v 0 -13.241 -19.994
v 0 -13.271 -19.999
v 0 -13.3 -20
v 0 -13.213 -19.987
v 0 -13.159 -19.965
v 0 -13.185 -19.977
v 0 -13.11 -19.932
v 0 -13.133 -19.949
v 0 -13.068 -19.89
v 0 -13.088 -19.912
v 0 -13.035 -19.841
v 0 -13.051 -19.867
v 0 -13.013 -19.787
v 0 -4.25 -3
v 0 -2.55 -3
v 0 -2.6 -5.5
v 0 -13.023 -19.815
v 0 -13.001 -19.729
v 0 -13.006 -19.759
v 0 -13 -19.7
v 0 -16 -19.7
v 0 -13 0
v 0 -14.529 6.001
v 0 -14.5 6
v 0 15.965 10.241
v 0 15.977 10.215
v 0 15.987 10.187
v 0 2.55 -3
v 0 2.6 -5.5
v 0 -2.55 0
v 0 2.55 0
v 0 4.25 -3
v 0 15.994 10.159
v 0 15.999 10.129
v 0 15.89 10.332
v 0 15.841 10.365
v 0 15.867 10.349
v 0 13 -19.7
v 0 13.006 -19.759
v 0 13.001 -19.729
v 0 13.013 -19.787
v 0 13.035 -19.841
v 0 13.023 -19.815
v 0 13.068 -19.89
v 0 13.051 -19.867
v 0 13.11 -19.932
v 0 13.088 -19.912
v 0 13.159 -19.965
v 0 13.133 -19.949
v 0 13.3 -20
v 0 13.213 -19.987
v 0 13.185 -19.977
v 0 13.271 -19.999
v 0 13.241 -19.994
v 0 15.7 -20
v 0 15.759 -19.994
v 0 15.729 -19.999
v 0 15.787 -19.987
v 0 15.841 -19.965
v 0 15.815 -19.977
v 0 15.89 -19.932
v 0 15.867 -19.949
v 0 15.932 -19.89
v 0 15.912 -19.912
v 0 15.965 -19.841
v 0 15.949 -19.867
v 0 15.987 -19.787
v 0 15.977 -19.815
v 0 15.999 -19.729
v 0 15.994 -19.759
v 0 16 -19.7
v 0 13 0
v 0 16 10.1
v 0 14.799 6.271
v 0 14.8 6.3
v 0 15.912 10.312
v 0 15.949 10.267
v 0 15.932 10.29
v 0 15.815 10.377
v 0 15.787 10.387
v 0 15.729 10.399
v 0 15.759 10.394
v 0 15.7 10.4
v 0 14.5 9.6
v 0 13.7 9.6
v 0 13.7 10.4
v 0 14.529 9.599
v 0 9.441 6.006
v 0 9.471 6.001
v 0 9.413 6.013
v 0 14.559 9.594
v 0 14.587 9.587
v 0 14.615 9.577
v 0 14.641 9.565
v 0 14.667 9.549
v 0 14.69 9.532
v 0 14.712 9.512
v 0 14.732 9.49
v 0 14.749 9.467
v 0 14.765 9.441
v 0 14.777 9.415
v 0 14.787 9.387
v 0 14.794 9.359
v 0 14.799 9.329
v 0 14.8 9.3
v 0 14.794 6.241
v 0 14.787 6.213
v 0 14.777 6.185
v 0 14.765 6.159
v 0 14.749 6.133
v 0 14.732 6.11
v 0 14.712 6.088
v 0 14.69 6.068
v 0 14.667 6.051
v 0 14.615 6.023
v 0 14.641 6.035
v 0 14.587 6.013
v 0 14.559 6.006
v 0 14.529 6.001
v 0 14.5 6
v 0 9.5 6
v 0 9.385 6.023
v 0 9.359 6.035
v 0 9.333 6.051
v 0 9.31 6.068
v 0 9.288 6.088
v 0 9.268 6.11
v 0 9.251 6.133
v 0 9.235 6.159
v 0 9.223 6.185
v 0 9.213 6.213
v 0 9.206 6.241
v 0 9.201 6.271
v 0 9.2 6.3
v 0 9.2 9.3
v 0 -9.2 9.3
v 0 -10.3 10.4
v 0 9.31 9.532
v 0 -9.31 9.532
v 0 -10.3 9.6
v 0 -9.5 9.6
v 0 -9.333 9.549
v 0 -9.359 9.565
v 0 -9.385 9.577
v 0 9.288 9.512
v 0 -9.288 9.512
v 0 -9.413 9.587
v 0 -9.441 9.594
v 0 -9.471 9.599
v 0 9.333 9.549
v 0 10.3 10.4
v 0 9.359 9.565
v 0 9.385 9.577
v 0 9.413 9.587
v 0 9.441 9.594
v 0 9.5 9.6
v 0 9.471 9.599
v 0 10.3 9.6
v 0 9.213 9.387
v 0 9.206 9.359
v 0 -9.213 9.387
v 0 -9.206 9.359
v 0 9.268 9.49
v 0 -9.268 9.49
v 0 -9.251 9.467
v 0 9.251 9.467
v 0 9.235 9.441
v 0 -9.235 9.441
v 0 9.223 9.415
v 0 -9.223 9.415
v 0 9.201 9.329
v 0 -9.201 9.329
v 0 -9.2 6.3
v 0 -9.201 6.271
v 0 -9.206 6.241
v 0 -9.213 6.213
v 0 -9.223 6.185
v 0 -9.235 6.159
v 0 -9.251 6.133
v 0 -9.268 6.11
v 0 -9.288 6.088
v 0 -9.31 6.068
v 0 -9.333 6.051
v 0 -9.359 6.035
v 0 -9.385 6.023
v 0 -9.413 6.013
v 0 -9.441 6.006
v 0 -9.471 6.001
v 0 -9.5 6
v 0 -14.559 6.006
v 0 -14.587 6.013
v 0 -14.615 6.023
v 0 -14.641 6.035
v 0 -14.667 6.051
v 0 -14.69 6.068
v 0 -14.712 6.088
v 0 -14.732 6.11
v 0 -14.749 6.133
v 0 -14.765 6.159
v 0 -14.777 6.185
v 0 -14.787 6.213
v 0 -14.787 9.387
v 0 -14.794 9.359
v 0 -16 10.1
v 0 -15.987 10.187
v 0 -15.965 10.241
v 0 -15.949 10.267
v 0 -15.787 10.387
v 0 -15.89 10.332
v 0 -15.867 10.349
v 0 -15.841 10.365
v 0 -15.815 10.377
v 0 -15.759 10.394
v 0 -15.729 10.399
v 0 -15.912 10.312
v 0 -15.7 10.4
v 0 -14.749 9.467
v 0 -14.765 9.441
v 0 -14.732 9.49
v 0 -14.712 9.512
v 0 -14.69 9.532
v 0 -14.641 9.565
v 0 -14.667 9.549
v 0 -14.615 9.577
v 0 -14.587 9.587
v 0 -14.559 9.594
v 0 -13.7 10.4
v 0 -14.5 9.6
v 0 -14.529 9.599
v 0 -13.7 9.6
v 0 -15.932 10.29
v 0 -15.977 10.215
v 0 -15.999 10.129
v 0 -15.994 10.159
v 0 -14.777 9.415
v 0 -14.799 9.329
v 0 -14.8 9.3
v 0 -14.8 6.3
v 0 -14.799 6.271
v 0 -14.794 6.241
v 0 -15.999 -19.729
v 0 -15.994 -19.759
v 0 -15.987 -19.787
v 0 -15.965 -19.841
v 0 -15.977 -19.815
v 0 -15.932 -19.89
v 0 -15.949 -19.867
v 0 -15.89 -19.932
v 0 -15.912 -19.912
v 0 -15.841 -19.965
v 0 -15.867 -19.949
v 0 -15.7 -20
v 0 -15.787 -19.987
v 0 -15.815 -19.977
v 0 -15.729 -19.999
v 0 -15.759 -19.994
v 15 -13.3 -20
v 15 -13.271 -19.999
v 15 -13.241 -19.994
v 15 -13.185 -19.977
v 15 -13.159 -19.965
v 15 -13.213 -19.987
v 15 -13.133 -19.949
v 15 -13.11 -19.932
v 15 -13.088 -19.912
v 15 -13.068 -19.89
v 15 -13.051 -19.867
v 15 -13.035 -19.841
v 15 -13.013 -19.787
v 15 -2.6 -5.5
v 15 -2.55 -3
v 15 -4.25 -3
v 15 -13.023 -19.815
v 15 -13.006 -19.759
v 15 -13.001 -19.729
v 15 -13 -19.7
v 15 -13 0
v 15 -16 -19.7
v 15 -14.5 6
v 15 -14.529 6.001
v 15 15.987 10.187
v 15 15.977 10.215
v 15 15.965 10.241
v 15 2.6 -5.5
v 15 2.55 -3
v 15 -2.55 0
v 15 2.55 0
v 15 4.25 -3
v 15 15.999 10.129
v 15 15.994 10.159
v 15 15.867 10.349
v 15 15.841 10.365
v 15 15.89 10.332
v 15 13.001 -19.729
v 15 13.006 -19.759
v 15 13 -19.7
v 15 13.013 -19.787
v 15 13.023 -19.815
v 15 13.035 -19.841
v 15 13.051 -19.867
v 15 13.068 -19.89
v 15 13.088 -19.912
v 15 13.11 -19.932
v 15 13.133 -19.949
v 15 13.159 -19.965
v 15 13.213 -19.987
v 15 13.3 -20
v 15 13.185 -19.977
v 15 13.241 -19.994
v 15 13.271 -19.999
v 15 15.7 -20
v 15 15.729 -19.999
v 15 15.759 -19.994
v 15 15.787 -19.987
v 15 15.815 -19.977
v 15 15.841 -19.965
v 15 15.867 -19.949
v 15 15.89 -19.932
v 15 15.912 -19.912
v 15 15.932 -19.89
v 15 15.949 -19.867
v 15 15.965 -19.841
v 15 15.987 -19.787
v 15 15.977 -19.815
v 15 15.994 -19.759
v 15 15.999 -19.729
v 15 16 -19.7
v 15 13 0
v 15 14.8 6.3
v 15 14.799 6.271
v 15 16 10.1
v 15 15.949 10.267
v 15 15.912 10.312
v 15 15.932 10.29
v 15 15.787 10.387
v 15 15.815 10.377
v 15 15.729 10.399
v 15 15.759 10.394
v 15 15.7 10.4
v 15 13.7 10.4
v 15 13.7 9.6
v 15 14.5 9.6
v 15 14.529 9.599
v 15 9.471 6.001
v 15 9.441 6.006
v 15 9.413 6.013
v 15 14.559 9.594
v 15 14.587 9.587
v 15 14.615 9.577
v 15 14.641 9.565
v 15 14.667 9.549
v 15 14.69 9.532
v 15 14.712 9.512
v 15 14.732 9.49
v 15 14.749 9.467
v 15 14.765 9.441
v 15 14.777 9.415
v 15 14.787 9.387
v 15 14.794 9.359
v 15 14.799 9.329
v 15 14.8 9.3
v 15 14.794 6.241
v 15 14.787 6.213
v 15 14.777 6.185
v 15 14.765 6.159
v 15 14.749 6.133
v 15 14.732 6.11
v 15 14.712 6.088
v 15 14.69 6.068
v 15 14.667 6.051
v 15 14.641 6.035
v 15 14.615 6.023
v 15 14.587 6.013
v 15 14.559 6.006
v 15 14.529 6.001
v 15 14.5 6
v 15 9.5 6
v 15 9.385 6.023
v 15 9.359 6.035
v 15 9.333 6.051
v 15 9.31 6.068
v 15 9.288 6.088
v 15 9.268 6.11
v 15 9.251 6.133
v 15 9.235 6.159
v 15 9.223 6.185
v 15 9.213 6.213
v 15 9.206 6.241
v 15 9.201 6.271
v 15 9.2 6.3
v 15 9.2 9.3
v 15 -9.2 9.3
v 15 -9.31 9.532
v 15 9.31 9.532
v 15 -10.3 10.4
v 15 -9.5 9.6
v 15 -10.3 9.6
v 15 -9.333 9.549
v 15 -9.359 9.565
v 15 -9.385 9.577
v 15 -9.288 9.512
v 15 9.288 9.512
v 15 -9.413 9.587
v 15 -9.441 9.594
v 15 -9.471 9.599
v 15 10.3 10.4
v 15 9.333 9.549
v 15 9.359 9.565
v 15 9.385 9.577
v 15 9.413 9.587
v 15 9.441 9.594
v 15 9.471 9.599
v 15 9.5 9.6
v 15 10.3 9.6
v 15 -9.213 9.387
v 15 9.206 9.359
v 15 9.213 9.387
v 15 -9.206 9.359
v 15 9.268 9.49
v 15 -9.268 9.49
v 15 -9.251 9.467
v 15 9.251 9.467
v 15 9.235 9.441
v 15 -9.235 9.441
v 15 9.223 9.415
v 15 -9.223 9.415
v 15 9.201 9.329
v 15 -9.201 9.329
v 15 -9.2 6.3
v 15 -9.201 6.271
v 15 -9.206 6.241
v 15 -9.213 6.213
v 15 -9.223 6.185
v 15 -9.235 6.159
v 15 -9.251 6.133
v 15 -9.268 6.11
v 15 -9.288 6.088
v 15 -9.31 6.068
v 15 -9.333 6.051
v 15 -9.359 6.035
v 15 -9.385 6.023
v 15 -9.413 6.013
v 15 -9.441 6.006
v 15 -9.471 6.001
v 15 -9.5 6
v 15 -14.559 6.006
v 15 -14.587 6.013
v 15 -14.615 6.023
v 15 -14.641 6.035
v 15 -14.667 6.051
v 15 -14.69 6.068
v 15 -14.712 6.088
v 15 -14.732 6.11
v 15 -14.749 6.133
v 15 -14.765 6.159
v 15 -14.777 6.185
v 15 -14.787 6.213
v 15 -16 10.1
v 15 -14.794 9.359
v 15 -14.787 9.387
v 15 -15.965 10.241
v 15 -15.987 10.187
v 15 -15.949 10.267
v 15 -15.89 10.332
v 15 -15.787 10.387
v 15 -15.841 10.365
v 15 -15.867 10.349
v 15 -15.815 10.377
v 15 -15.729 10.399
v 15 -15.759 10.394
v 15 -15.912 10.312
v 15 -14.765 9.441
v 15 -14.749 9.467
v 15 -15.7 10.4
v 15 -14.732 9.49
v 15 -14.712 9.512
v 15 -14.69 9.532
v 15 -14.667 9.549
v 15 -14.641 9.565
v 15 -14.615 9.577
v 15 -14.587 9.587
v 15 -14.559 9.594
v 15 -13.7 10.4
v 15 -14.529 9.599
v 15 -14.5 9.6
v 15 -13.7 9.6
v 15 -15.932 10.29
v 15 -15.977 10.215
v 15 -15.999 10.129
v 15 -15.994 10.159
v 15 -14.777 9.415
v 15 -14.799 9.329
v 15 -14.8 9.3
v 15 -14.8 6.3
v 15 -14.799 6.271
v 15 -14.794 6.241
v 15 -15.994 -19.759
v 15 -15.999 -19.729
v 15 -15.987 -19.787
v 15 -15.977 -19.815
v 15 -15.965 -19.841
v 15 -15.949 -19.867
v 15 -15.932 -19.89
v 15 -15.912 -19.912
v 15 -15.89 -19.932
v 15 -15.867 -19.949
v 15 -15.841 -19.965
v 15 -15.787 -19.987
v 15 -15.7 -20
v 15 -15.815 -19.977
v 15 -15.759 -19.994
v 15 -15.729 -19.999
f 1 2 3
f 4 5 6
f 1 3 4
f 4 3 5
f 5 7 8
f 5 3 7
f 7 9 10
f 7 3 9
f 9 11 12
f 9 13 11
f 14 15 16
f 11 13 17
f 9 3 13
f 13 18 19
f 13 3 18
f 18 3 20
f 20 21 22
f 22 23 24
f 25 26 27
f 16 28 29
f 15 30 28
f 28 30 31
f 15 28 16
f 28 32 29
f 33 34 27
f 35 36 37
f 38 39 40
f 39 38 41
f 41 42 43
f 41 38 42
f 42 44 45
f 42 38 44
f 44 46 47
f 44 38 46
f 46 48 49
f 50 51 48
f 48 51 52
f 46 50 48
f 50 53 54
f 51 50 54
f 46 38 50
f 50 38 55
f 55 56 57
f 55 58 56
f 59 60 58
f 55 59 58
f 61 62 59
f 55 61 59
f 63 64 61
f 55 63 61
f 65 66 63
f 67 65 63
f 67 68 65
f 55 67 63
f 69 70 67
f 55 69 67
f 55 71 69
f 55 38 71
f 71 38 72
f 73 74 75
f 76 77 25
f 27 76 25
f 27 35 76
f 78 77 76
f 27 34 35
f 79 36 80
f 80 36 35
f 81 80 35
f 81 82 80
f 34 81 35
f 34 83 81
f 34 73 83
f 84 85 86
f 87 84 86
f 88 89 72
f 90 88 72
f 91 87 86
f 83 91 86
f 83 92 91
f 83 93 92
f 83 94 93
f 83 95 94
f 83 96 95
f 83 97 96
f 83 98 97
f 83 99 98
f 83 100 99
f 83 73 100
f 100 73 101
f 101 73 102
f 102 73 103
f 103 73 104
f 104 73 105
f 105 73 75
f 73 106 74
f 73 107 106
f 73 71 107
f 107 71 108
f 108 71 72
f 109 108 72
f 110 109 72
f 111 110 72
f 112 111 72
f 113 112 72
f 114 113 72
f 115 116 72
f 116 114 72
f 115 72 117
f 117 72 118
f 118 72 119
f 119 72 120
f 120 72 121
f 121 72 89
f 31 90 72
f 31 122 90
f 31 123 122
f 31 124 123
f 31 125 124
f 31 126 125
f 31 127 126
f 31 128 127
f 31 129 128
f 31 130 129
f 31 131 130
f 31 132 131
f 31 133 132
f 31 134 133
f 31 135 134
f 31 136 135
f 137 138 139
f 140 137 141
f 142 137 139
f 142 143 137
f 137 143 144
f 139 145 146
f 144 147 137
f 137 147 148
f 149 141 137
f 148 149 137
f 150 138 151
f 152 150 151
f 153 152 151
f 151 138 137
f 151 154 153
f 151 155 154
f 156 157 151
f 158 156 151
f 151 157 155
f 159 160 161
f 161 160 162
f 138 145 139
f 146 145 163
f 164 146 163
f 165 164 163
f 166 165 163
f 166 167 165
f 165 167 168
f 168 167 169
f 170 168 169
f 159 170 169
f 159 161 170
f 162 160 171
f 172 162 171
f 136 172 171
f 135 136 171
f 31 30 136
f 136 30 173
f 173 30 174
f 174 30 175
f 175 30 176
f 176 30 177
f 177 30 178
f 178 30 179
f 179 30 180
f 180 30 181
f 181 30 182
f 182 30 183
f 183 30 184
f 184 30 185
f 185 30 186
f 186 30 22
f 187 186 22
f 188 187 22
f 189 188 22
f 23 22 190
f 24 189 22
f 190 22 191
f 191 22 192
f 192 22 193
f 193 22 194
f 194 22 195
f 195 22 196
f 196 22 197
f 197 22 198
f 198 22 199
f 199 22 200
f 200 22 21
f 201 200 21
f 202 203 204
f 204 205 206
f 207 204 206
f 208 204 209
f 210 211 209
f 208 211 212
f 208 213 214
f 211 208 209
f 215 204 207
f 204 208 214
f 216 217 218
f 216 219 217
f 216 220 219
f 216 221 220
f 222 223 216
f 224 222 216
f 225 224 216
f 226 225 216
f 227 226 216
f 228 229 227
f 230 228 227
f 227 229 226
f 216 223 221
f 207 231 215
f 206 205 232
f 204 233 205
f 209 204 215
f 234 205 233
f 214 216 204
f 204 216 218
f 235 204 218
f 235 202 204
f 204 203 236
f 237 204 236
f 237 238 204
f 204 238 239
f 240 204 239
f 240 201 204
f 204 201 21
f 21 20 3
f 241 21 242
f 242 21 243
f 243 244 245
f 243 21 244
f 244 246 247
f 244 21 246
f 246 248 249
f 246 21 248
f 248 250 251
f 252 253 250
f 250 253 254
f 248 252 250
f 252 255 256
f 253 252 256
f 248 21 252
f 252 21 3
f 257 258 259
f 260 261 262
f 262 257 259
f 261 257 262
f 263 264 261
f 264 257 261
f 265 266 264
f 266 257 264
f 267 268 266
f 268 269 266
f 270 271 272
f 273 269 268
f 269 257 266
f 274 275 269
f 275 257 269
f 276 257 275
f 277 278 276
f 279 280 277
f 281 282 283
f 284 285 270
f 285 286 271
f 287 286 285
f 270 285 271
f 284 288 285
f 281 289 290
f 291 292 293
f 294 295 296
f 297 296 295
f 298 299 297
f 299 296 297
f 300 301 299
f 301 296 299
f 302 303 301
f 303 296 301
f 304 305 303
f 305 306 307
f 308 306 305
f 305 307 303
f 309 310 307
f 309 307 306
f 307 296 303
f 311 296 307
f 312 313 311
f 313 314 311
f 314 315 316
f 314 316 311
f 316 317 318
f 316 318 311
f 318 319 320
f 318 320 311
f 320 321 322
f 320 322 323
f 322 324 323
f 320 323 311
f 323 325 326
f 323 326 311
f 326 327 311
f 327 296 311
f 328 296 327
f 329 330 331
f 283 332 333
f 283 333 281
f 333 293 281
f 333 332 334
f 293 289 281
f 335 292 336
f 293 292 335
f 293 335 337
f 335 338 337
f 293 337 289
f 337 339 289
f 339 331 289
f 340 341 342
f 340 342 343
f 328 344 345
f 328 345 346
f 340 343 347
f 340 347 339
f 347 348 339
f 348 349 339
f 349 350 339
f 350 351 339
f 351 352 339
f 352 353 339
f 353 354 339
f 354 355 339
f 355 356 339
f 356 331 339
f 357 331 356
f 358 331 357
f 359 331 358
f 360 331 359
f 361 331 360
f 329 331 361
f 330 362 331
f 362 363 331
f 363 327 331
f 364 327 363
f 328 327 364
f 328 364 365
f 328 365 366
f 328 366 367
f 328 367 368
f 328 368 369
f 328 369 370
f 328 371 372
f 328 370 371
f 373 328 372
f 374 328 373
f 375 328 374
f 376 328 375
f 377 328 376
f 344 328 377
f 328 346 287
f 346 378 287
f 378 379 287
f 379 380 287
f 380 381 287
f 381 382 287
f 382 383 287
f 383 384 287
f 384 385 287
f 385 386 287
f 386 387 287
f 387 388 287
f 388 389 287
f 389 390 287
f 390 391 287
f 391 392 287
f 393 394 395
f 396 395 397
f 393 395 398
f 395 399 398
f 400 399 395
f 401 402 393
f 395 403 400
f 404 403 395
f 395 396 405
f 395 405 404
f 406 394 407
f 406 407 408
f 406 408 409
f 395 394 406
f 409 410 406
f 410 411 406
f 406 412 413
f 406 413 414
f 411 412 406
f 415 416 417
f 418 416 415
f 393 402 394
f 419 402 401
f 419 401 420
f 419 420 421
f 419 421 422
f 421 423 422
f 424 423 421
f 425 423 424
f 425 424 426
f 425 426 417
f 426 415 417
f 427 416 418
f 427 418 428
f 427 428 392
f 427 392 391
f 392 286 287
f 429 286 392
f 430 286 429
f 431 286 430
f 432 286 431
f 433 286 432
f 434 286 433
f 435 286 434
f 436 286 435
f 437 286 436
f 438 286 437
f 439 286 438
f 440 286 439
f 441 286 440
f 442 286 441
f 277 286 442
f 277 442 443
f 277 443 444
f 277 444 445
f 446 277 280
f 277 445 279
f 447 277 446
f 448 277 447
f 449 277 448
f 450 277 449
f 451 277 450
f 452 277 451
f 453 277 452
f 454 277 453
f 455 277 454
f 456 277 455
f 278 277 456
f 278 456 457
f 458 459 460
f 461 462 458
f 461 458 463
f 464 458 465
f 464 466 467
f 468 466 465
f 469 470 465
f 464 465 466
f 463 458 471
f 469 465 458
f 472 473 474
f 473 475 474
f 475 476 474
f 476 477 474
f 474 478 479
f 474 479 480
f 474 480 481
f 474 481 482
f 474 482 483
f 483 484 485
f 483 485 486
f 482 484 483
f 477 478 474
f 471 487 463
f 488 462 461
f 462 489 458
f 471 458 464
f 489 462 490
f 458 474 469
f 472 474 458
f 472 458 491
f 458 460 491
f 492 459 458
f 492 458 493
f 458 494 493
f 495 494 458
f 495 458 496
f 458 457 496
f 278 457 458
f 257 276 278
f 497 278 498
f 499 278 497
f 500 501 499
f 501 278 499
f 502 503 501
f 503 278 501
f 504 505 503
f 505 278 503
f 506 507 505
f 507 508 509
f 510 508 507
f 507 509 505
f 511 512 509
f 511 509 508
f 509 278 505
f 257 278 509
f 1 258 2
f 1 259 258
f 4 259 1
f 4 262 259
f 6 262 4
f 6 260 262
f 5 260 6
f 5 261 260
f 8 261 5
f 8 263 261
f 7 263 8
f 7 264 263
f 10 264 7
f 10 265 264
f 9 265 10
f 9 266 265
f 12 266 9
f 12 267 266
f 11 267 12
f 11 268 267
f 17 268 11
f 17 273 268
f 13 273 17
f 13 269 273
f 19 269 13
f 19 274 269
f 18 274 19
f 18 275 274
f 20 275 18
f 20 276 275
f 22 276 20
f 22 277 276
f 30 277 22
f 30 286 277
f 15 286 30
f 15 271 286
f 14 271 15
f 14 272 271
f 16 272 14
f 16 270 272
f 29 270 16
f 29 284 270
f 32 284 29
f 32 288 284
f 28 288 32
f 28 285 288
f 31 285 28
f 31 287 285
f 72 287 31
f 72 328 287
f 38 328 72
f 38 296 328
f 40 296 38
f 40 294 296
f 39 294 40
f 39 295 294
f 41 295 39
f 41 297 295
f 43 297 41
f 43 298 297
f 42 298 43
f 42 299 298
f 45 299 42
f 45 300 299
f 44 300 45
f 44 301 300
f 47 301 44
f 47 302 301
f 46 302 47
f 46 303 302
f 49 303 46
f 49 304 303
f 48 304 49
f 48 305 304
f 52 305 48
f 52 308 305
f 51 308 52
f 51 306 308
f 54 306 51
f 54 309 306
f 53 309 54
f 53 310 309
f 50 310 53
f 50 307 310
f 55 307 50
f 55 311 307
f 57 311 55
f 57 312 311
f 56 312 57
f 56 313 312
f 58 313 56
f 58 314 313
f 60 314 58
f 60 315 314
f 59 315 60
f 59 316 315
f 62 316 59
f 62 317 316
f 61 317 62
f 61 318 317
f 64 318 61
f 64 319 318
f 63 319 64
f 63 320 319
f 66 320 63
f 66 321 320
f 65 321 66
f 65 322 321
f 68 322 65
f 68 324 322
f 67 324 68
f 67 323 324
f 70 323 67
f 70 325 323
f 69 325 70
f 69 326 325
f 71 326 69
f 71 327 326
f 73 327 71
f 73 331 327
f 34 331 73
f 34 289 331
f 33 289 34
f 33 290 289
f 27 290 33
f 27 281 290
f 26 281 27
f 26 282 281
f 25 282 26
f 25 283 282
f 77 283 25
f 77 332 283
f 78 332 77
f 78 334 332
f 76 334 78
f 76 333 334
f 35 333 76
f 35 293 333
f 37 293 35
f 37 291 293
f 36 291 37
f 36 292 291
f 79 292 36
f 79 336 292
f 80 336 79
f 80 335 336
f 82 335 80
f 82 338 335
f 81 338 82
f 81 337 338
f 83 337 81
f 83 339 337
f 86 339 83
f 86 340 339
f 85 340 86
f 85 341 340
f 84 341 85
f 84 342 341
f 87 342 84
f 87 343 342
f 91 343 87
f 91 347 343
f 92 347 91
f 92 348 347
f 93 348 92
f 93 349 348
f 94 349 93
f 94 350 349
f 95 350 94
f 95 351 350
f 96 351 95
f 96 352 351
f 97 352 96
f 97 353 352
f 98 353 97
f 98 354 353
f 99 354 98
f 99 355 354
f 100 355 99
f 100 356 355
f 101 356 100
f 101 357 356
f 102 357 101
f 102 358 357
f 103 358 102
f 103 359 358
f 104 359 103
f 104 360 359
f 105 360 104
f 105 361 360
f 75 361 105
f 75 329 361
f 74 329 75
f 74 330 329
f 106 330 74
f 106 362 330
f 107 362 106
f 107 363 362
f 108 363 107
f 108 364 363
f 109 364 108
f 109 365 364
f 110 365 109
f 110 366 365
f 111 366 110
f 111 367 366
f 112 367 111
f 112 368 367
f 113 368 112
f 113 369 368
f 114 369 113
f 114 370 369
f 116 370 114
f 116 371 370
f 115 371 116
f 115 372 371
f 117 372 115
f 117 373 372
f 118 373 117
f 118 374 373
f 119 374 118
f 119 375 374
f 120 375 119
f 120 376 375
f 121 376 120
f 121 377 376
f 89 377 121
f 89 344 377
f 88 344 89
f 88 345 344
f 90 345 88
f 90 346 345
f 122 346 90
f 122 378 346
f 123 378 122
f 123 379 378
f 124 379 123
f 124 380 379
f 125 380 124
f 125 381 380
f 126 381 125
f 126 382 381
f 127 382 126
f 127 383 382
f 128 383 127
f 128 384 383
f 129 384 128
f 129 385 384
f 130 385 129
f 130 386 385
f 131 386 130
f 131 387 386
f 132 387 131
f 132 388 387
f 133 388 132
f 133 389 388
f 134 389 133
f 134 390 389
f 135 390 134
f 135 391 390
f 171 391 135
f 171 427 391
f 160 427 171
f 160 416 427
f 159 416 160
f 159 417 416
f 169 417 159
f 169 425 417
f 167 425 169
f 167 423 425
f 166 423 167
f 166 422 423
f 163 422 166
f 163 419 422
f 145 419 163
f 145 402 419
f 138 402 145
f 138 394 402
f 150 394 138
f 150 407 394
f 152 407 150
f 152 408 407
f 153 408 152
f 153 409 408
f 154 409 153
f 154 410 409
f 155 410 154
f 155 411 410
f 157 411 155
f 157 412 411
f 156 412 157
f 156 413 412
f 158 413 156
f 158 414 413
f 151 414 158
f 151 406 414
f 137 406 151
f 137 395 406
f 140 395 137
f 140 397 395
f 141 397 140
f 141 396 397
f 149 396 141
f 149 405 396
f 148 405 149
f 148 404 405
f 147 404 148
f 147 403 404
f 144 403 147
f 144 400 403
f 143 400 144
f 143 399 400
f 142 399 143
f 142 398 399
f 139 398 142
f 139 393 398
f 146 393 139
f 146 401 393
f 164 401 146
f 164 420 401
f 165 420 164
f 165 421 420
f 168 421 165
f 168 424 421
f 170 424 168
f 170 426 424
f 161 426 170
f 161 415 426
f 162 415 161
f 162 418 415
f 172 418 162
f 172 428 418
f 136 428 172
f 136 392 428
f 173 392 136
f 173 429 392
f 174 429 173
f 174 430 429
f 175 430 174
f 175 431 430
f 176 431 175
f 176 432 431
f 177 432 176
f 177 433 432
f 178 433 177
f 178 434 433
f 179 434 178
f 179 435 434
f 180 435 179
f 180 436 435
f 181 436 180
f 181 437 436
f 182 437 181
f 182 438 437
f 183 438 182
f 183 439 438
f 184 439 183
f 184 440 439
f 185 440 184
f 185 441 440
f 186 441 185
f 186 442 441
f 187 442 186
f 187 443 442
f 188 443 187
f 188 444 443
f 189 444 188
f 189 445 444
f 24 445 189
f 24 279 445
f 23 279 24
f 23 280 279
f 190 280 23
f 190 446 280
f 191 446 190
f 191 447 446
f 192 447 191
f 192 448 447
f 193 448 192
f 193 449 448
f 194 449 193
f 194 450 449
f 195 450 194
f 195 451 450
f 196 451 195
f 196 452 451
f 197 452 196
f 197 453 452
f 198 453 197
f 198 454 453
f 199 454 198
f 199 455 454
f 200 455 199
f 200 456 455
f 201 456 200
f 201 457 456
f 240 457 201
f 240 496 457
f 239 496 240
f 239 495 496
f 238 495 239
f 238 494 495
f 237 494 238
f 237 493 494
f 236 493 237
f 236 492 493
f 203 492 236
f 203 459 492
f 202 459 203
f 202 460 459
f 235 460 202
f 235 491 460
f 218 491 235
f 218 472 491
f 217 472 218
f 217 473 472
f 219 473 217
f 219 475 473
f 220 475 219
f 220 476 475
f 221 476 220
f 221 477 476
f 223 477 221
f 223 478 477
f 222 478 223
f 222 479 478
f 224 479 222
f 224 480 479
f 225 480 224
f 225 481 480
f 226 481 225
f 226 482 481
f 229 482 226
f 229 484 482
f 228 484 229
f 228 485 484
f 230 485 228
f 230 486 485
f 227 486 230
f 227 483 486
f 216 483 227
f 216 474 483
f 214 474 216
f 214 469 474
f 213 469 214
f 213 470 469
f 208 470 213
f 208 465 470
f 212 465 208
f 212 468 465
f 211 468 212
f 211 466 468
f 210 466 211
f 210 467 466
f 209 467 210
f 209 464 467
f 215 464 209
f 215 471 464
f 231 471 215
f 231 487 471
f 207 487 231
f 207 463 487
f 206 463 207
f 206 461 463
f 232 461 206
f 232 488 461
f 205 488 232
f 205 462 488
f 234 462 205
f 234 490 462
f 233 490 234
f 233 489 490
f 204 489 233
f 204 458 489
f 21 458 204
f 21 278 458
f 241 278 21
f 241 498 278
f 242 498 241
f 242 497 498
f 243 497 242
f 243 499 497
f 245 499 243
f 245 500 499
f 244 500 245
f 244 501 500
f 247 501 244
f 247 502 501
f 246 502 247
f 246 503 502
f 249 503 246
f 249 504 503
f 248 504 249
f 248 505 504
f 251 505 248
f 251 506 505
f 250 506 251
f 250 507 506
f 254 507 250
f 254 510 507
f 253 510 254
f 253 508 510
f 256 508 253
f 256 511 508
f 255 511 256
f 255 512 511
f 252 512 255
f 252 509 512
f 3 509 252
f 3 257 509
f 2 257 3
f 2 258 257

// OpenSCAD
// 2020 -> Eurorack threaded-strip adapter (dual-strip version)
//
// Variant of 2020-adapter.scad with captive strip channels on BOTH sides
// of the rail body (mirrored around Y=0).
//
// License: MIT, Copyright (c) 2026 Madelyn Yeary. See LICENSE.md at the repo root.

// ---- parameters ----------------------------------------------------------

length              = 15;  // rail length. My printer can only print 100mm wide so
                              // 84HP = 128.5; 104HP = 158.75; etc.

// 2020 slot profile (generic Misumi-style tapered T-slot).
slot_opening        = 5.3;    // gap between outer lips (+0.2 clearance)
slot_lip_depth      = 3;    // depth of the straight opening between lips
slot_chamfer_depth  = 2.5;    // depth of the tapered transition (lips flaring out)
slot_inner_width    = 9.1;    // width at the top of the chamfer (just past the lips)
slot_tip_width      = 5.8;    // width of the flat tip at the bottom of the chamfer

// Tab geometry
use_t_tab           = true;   // true = full T-profile matching the tapered slot
                              // false = simple rectangular stem only.
tab_clearance       = 0.3;    // shrink applied to head dimensions

// Main body sitting on the extrusion's outer face
body_width          = 32.0;   // Y extent of the shelf
body_thickness      = 6.0;    // Z thickness below the strip channel

// Eurorack threaded-strip channel (captive C-channel, opens toward +Z).
strip_width         = 5.6;    // Y width of each strip cavity
strip_height        = 3.6;    // Z height of each strip cavity
strip_lip           = 0.8;    // Z thickness of the top retaining lip
strip_y_offset      = 12;    // cavity center offset from body center (mirrored +/-)

// Screw-access slot cut through the top face above each strip
access_slot_width   = 3.4;    // clearance for M3 (use 2.9 for M2.5)

// Side walls that hang down past the extrusion's two side faces, so the
// adapter wraps the rail instead of hanging off the slot tab alone.
use_side_walls      = true;
rail_size           = 25.6;   // extrusion face width and depth (2020)
wall_clearance      = 0.2;    // gap between each wall and the extrusion side
wall_thickness      = 3.0;    // Y thickness of each side wall
wall_depth          = 20.0;   // Z length below the shelf; 20 covers the full side

// Corner rounding (applied to shelf and strip cavities)
fillet              = 0.3;

$fn = 64;

// ---- derived -------------------------------------------------------------

tab_stem_w    = slot_opening - 0.2;
tab_head_w    = slot_inner_width - 2*tab_clearance;
tab_tip_w     = slot_tip_width - 2*tab_clearance;
tab_chamfer_h = slot_chamfer_depth;
total_h       = body_thickness + strip_height + strip_lip;

assert(!use_side_walls
       || body_width/2 >= rail_size/2 + wall_clearance + wall_thickness,
       "body_width is too narrow to carry the side walls");

// ---- 2D cross-section (in the Y-Z plane) --------------------------------

module rounded_rect_2d(size, r) {
    if (r <= 0) {
        square(size);
    } else {
        hull()
            for (x = [r, size[0] - r])
                for (y = [r, size[1] - r])
                    translate([x, y]) circle(r);
    }
}

module tab_profile_2d() {
    if (use_t_tab) {
        z_stem_bot    = -slot_lip_depth;
        z_chamfer_bot = z_stem_bot - tab_chamfer_h;
        polygon(points = [
            [-tab_stem_w/2, 0],
            [ tab_stem_w/2, 0],
            [ tab_stem_w/2, z_stem_bot],
            [ tab_head_w/2, z_stem_bot],
            [ tab_tip_w/2,  z_chamfer_bot],
            [-tab_tip_w/2,  z_chamfer_bot],
            [-tab_head_w/2, z_stem_bot],
            [-tab_stem_w/2, z_stem_bot],
        ]);
    } else {
        translate([-tab_stem_w/2, -slot_lip_depth])
            square([tab_stem_w, slot_lip_depth]);
    }
}

module side_walls_2d() {
    // Overlap the shelf by `fillet` so the walls fuse with the body.
    wall_inner_y = rail_size/2 + wall_clearance;
    for (side = [1, -1])
        translate([side > 0 ? wall_inner_y : -wall_inner_y - wall_thickness,
                   -wall_depth])
            rounded_rect_2d([wall_thickness, wall_depth + fillet*2], fillet);
}

module rail_profile_2d() {
    // Cut mirrored cavities and access slots at +/- strip_y_offset.
    difference() {
        union() {
            translate([-body_width/2, 0])
                rounded_rect_2d([body_width, total_h], fillet);
            tab_profile_2d();
            if (use_side_walls) side_walls_2d();
        }

        for (yoff = [strip_y_offset, -strip_y_offset]) {
            translate([yoff - strip_width/2, body_thickness])
                rounded_rect_2d([strip_width, strip_height], fillet);

            translate([yoff - access_slot_width/2,
                       body_thickness + strip_height])
                square([access_slot_width, strip_lip + 0.1]);
        }
    }
}

// ---- 3D ------------------------------------------------------------------

module rail() {
    rotate([90, 0, 90])
        linear_extrude(height = length, convexity = 4)
            rail_profile_2d();
}

rail();

// Uncomment to preview just the cross-section:
//rail_profile_2d();
